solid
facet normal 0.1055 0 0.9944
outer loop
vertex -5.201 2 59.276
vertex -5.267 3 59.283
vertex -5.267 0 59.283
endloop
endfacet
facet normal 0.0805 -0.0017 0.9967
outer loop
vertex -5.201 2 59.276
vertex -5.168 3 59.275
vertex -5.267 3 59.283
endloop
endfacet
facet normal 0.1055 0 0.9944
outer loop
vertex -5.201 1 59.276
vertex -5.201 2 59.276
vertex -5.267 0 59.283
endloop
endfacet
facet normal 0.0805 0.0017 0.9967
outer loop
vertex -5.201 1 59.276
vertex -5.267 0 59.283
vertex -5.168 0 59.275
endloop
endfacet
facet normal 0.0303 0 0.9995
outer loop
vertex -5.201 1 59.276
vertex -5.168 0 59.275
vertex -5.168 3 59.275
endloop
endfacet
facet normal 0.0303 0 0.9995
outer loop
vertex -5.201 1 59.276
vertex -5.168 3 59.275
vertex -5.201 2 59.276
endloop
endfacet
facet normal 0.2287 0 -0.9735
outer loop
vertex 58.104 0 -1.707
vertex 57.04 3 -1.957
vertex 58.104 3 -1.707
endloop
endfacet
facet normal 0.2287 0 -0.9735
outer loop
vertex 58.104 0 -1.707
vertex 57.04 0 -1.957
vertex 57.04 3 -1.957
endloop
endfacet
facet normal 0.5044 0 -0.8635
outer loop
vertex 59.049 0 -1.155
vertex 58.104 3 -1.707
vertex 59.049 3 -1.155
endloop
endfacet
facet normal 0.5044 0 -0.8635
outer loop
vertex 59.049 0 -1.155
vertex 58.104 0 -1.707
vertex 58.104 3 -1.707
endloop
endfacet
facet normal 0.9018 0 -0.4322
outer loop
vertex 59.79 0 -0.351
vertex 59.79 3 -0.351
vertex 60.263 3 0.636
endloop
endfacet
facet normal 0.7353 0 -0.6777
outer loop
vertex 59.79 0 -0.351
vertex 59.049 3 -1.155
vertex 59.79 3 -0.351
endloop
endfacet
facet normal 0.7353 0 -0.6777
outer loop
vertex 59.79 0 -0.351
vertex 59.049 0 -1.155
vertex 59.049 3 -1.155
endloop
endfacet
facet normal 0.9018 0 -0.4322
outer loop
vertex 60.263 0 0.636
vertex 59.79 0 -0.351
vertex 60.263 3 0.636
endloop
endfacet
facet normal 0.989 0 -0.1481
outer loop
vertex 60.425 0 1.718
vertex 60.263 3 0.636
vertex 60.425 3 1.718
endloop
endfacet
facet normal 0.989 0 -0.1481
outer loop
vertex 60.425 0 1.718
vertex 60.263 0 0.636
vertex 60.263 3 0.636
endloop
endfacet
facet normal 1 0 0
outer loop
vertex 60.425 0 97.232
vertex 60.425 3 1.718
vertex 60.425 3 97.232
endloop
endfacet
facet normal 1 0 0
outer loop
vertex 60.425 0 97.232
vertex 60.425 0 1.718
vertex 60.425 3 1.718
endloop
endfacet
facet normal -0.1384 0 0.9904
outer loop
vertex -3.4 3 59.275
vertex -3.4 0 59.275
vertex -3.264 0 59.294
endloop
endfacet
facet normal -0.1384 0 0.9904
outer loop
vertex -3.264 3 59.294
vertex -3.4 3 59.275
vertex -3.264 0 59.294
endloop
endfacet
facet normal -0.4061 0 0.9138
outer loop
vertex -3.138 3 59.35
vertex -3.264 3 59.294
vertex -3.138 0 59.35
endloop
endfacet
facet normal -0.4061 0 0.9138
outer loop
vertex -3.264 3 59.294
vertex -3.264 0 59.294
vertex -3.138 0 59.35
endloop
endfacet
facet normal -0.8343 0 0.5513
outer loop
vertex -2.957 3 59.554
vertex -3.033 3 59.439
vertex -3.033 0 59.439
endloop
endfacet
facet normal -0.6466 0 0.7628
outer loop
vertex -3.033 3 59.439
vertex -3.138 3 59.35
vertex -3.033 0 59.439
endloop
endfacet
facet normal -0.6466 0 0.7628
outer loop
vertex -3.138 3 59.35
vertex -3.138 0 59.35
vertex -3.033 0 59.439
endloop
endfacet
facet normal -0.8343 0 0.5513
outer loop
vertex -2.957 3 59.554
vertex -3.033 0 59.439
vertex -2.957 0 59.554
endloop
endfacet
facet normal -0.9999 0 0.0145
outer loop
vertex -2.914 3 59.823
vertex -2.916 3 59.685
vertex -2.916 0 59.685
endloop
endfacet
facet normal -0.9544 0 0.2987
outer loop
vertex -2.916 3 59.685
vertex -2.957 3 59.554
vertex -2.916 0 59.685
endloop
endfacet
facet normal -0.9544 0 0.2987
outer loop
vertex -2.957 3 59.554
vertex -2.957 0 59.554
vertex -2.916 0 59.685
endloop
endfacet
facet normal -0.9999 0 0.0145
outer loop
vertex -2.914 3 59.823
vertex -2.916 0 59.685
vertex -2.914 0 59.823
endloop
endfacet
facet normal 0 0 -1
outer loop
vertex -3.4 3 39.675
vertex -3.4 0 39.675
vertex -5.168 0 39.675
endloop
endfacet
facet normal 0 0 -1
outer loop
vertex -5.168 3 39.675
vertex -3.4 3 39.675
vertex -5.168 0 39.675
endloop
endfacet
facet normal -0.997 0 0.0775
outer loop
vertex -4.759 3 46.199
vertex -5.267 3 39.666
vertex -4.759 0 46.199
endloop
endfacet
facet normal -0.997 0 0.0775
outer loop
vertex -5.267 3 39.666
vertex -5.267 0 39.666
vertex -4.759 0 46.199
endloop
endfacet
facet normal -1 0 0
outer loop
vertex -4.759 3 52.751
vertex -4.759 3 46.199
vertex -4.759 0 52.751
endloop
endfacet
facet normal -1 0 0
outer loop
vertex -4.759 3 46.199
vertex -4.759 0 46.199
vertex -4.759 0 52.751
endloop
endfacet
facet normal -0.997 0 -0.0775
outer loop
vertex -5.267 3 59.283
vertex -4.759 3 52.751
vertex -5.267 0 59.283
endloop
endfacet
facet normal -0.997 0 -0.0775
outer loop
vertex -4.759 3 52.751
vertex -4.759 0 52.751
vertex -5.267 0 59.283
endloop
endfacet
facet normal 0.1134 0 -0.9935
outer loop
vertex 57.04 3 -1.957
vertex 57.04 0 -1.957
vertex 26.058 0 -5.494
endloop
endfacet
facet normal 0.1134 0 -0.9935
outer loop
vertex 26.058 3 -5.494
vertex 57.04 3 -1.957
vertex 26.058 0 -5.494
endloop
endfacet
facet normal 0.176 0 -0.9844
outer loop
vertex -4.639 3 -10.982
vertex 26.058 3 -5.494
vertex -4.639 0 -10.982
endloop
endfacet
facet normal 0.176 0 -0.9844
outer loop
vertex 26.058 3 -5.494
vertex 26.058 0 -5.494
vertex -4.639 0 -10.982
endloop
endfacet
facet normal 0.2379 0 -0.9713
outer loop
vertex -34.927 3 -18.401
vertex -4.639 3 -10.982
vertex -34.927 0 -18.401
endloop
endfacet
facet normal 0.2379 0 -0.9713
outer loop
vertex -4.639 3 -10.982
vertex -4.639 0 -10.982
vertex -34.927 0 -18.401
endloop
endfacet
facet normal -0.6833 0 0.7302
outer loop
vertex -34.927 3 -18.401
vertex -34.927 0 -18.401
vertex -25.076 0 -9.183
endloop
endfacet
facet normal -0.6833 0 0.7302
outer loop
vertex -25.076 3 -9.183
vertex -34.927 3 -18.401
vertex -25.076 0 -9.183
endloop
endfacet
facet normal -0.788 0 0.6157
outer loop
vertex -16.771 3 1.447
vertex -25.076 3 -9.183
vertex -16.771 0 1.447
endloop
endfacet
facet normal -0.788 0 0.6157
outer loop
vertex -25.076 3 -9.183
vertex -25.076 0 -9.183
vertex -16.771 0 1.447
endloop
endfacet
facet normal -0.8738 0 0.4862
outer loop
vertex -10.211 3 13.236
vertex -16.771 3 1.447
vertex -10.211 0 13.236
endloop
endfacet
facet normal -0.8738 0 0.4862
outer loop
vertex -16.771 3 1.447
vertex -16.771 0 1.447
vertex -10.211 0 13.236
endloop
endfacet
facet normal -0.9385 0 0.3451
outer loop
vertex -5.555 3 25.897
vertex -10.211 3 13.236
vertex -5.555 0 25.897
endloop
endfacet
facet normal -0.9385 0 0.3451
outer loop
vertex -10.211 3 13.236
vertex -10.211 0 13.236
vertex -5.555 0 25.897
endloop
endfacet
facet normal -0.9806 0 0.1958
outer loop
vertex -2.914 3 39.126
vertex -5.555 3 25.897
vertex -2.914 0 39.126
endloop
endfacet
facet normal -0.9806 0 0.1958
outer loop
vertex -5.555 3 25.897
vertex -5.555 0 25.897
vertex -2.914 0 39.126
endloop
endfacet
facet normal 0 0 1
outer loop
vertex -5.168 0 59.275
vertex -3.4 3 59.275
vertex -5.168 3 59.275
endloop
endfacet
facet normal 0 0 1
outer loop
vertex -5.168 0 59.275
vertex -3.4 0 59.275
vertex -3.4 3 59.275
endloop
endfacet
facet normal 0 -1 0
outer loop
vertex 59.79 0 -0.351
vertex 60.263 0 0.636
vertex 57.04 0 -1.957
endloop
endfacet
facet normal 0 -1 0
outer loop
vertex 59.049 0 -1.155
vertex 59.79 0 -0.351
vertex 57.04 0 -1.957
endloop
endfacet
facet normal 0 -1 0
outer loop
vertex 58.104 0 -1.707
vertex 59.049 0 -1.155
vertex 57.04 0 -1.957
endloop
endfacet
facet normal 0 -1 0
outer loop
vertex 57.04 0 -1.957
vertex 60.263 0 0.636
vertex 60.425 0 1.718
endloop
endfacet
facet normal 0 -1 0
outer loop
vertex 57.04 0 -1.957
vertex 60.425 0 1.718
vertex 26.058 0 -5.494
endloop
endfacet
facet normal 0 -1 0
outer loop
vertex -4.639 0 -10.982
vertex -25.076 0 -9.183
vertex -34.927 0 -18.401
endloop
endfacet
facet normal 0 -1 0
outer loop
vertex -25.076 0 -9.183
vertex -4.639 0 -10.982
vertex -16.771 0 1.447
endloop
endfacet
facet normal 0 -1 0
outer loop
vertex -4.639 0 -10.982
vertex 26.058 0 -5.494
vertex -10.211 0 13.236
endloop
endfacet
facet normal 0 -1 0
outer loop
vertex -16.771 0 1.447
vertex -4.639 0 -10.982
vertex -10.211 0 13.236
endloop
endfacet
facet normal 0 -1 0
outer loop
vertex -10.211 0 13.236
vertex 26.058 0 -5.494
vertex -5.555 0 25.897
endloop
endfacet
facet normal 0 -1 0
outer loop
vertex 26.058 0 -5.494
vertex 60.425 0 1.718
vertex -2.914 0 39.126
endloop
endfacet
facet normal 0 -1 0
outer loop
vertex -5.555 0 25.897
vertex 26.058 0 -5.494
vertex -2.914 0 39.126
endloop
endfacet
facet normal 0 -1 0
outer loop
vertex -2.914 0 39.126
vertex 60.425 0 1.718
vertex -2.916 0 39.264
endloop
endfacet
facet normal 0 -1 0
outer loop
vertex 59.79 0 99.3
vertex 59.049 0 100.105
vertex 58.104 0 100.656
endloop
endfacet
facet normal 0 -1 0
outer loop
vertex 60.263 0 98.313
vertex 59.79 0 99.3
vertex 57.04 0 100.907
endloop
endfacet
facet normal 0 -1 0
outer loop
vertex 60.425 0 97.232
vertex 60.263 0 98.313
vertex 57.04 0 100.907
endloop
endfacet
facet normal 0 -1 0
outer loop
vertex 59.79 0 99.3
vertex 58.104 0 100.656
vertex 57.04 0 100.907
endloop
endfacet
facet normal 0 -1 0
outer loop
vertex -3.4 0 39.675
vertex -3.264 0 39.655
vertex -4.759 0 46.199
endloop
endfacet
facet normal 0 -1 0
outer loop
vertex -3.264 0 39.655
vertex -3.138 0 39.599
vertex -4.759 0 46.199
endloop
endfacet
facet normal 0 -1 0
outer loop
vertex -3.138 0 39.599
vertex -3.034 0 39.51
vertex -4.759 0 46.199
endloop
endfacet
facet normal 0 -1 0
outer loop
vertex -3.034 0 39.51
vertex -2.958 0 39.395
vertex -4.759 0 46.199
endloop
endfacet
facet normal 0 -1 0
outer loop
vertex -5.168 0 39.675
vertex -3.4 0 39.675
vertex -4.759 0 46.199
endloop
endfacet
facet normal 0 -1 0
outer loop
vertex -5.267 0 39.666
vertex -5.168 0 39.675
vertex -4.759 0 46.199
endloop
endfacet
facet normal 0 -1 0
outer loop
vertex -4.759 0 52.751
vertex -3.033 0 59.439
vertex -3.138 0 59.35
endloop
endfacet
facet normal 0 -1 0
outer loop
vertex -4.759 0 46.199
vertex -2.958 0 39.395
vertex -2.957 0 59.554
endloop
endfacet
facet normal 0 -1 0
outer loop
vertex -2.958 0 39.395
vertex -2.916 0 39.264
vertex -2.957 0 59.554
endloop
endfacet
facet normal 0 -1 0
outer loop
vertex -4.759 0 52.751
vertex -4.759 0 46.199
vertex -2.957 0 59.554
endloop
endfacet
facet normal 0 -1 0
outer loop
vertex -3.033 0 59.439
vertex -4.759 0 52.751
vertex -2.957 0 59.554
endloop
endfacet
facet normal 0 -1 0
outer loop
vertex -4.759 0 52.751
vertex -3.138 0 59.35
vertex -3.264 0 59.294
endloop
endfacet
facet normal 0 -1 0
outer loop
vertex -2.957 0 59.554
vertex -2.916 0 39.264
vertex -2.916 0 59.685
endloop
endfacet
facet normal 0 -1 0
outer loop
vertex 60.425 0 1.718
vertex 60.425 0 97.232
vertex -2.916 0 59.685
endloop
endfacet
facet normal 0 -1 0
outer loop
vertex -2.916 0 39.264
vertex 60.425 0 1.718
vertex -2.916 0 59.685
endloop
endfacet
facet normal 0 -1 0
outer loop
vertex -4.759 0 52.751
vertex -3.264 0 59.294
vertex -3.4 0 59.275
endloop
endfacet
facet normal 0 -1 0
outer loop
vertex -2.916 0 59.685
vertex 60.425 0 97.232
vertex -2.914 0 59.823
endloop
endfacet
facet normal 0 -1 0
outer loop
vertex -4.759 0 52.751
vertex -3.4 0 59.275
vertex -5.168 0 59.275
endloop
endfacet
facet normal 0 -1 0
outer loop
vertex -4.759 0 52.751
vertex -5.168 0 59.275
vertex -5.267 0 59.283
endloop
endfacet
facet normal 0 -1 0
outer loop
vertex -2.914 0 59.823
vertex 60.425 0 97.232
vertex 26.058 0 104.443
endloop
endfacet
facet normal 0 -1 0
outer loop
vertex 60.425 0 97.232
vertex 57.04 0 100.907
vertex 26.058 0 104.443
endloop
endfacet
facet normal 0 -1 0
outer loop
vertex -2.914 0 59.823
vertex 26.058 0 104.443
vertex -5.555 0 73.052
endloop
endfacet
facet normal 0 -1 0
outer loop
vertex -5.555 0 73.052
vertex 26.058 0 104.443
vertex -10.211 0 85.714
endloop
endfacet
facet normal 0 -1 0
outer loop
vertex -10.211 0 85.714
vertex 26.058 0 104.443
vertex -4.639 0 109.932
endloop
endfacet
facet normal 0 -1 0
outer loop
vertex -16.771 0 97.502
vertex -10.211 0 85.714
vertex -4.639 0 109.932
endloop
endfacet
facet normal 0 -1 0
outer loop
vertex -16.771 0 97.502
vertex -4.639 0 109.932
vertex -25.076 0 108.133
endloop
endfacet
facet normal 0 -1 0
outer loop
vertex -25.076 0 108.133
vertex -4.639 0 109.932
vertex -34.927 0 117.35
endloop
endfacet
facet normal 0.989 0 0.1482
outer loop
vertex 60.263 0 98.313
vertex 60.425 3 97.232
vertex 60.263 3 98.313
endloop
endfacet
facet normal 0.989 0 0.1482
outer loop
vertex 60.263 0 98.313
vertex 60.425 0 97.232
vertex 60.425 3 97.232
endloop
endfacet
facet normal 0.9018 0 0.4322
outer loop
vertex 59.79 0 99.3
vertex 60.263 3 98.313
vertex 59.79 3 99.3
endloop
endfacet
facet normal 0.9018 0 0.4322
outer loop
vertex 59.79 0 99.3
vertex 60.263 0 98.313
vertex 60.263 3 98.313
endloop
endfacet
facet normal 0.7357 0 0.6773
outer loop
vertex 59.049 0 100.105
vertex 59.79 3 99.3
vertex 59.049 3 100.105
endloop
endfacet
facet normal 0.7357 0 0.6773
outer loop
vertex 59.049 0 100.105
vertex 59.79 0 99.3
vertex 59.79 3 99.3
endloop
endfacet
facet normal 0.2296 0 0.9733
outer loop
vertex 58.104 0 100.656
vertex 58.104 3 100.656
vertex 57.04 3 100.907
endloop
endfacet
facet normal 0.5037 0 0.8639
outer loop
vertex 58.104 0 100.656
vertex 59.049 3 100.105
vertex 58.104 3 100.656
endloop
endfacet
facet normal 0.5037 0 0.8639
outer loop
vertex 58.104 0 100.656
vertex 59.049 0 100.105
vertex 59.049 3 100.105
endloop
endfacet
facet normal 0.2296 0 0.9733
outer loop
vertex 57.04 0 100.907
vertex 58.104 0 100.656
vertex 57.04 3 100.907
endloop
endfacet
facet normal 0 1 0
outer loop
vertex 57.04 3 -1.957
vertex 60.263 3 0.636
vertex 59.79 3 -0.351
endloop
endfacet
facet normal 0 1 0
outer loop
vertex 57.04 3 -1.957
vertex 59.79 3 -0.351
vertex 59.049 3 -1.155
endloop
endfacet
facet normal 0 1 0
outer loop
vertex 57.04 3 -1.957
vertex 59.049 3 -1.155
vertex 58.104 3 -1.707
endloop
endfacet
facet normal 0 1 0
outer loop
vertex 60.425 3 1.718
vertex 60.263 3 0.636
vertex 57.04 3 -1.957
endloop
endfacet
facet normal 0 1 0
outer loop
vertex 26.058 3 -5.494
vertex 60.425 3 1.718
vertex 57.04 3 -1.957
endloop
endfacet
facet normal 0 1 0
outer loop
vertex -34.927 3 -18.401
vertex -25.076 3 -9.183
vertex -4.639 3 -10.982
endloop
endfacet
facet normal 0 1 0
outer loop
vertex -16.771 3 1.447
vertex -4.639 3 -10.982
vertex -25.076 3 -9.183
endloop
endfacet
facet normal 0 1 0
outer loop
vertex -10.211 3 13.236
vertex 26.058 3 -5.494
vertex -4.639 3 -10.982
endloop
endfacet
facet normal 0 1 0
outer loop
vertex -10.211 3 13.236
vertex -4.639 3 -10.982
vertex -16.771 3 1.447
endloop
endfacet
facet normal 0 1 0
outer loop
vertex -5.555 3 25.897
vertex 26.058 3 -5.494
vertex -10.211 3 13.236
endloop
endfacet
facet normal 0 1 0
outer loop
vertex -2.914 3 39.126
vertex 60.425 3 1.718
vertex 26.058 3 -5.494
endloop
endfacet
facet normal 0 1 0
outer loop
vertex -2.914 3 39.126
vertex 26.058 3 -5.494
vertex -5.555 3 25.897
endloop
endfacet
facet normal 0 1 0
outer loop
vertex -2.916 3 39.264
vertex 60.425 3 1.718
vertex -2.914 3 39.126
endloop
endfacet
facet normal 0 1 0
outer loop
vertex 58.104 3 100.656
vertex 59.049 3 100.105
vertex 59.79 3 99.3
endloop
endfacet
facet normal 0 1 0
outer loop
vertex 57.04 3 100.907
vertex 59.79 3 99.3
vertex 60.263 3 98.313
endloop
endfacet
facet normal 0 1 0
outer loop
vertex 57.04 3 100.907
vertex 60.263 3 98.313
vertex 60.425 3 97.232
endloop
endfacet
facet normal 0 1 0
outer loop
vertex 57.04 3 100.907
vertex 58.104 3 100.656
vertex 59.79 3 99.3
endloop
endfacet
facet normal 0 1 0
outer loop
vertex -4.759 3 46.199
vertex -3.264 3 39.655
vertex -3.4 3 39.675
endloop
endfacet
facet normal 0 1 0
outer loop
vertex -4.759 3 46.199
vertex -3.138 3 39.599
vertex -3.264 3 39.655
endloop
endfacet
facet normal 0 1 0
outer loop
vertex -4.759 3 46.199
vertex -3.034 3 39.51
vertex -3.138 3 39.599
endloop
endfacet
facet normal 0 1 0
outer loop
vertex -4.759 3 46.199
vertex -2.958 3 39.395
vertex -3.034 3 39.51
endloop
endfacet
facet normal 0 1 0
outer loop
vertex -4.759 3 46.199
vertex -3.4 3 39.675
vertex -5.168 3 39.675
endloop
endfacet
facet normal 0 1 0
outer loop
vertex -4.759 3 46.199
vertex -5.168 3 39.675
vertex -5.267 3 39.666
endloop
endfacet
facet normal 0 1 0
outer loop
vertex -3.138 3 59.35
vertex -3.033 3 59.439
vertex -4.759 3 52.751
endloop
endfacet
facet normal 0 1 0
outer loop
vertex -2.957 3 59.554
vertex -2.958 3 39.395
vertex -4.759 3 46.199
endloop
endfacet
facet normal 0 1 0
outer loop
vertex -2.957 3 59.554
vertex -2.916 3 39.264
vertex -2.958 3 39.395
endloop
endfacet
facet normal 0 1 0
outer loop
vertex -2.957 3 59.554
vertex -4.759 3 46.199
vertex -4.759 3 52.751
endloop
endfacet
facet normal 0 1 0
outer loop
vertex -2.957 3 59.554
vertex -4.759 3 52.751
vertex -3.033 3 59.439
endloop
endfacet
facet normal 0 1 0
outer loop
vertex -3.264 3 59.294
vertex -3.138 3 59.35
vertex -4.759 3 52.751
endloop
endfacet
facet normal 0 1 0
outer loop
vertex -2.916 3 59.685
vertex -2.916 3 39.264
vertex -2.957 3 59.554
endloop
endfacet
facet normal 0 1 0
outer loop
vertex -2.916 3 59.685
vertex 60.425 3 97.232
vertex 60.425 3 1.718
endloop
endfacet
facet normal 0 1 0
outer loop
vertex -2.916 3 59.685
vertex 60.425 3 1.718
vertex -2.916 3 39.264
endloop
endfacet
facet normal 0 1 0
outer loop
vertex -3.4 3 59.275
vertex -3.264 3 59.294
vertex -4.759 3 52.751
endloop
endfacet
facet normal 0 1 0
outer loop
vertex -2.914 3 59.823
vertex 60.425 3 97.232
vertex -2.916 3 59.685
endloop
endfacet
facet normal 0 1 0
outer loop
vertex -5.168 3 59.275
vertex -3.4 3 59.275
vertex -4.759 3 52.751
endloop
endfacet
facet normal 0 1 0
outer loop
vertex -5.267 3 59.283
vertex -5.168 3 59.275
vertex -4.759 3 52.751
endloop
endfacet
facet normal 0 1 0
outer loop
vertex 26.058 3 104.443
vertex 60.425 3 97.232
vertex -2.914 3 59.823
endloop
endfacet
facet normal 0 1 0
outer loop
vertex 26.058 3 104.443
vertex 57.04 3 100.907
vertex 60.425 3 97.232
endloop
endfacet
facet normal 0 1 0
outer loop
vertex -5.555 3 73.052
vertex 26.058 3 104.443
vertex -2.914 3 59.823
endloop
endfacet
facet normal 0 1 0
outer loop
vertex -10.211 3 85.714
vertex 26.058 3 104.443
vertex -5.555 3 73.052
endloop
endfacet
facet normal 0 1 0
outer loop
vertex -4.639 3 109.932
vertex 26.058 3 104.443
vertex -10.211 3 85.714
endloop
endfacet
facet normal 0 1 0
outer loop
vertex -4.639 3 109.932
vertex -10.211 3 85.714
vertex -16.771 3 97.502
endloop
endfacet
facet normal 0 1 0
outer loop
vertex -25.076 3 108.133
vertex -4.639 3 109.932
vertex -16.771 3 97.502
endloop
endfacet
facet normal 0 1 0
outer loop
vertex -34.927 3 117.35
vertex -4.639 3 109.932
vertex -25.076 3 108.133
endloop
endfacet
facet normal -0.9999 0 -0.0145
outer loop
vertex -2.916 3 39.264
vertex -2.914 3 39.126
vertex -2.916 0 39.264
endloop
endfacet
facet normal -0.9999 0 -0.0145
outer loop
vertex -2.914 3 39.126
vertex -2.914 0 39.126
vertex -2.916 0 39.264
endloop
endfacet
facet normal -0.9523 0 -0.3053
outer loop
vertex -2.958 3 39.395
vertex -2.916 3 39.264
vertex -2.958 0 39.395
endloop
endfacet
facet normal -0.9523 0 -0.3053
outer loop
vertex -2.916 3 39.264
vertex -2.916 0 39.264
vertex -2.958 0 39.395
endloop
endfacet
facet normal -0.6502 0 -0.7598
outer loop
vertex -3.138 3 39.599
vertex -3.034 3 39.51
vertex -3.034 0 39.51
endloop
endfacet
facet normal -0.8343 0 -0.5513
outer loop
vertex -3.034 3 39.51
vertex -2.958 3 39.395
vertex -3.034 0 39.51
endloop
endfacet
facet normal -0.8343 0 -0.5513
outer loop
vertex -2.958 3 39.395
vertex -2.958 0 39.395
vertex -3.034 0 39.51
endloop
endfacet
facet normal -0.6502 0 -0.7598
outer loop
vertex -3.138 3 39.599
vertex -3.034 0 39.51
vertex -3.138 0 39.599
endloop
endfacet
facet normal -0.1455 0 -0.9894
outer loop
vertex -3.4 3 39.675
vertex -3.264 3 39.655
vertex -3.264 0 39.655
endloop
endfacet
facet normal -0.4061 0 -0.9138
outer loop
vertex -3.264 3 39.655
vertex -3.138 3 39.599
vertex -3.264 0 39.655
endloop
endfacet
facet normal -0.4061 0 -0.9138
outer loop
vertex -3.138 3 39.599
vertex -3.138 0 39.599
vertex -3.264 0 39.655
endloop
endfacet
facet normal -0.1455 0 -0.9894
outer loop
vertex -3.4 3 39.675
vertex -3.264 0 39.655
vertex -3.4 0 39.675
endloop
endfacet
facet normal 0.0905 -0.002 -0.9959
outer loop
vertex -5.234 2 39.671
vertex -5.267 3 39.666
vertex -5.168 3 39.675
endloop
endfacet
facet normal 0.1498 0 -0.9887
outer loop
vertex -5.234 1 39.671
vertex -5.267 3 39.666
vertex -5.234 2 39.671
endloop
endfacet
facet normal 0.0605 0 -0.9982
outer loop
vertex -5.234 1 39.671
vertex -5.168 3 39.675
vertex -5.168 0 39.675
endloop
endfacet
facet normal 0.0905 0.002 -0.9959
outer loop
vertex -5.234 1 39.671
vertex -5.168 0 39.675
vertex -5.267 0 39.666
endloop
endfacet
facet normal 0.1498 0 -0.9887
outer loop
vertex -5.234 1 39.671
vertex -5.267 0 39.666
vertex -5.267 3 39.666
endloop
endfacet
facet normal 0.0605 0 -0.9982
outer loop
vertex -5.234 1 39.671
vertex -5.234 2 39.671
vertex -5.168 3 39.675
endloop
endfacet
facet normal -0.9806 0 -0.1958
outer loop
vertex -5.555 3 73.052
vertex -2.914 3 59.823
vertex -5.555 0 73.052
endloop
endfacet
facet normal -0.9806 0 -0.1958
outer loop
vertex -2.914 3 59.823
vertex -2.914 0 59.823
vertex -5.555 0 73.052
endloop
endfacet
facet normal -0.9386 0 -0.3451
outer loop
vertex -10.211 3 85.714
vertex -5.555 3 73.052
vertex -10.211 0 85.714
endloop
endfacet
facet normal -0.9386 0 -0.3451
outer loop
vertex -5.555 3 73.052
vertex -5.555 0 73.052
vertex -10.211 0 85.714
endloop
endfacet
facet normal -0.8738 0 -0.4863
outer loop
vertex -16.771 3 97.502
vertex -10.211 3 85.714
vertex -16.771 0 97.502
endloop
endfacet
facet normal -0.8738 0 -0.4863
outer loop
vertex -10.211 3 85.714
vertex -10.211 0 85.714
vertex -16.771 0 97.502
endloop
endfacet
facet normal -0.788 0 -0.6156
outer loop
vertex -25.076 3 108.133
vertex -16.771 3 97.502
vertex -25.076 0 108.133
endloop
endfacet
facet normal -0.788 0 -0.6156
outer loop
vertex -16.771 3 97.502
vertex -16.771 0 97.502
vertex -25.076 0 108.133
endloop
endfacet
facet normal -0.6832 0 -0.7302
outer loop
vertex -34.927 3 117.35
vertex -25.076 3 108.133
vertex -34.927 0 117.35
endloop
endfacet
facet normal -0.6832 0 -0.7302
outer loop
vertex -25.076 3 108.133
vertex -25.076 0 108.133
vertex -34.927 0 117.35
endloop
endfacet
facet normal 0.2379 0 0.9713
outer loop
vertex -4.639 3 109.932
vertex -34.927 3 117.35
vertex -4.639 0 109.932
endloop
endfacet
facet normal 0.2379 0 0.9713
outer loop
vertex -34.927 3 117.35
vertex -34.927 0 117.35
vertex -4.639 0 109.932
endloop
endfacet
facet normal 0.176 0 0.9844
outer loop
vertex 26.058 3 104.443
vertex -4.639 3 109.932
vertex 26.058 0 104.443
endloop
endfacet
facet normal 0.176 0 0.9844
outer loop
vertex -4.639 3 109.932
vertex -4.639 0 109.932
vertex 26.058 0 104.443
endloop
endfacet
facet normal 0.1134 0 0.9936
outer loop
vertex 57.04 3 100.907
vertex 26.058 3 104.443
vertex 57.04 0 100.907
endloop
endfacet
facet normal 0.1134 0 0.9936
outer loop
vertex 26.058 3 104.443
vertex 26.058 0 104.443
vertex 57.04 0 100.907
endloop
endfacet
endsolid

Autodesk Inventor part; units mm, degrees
ref_plane "YZ Plane" through (0, 0, 0) normal (1, 0, 0) x (0, 1, 0)
ref_plane "XZ Plane" through (0, 0, 0) normal (0, 1, 0) x (-1, 0, 0)
ref_plane "XY Plane" through (0, 0, 0) normal (0, 0, 1) x (1, 0, 0)
sketch "Sketch1" plane through (0, 0, 0) normal (0, 1, 0) x (-1, 0, 0)
  arc A0 (5.267, 59.2831) -> (5.267, 39.6662) centre (89.2034, 49.4746) ccw
  spline S0 degree 3 poles (5.1685, 59.2746) (5.2015, 59.2746) (5.2345, 59.2774) (5.267, 59.2831) knots -0.075945 -0.075945 -0.075945 -0.075945 -0.065858 -0.065858 -0.065858 -0.065858
  line L0 (3.4, 59.2746) -> (5.1685, 59.2746)
  arc A1 (2.9135, 59.8229) -> (3.4, 59.2746) centre (3.4, 59.7645) ccw
  arc A2 (34.9269, 117.3502) -> (2.9135, 59.8229) centre (89.2034, 49.4746) ccw
  arc A3 (-57.0396, 100.9066) -> (34.9269, 117.3502) centre (-97.4277, 592.1892) ccw
  arc A4 (-57.0396, 100.9066) -> (-60.4248, 97.2317) centre (-56.7375, 97.2317) ccw
  line L1 (-60.4248, 1.7175) -> (-60.4248, 97.2317)
  arc A5 (-60.4248, 1.7175) -> (-57.0396, -1.9573) centre (-56.7375, 1.7175) ccw
  arc A6 (34.9269, -18.4009) -> (-57.0396, -1.9573) centre (-97.4277, -493.24) ccw
  arc A7 (2.9135, 39.1264) -> (34.9269, -18.4009) centre (89.2034, 49.4746) ccw
  arc A8 (3.4, 39.6746) -> (2.9135, 39.1264) centre (3.4, 39.1847) ccw
  line L2 (3.4, 39.6746) -> (5.1685, 39.6746)
  spline S1 degree 3 poles (5.267, 39.6662) (5.2345, 39.6718) (5.2015, 39.6746) (5.1685, 39.6746) knots -0.010125 -0.010125 -0.010125 -0.010125 0 0 0 0
  point P0 (0, 0)
  point P1 (-1.1347, 1.9446)
extrude "Extrusion1" add sketch "Sketch1" along normal blind 3
properties part number "headset cover"
